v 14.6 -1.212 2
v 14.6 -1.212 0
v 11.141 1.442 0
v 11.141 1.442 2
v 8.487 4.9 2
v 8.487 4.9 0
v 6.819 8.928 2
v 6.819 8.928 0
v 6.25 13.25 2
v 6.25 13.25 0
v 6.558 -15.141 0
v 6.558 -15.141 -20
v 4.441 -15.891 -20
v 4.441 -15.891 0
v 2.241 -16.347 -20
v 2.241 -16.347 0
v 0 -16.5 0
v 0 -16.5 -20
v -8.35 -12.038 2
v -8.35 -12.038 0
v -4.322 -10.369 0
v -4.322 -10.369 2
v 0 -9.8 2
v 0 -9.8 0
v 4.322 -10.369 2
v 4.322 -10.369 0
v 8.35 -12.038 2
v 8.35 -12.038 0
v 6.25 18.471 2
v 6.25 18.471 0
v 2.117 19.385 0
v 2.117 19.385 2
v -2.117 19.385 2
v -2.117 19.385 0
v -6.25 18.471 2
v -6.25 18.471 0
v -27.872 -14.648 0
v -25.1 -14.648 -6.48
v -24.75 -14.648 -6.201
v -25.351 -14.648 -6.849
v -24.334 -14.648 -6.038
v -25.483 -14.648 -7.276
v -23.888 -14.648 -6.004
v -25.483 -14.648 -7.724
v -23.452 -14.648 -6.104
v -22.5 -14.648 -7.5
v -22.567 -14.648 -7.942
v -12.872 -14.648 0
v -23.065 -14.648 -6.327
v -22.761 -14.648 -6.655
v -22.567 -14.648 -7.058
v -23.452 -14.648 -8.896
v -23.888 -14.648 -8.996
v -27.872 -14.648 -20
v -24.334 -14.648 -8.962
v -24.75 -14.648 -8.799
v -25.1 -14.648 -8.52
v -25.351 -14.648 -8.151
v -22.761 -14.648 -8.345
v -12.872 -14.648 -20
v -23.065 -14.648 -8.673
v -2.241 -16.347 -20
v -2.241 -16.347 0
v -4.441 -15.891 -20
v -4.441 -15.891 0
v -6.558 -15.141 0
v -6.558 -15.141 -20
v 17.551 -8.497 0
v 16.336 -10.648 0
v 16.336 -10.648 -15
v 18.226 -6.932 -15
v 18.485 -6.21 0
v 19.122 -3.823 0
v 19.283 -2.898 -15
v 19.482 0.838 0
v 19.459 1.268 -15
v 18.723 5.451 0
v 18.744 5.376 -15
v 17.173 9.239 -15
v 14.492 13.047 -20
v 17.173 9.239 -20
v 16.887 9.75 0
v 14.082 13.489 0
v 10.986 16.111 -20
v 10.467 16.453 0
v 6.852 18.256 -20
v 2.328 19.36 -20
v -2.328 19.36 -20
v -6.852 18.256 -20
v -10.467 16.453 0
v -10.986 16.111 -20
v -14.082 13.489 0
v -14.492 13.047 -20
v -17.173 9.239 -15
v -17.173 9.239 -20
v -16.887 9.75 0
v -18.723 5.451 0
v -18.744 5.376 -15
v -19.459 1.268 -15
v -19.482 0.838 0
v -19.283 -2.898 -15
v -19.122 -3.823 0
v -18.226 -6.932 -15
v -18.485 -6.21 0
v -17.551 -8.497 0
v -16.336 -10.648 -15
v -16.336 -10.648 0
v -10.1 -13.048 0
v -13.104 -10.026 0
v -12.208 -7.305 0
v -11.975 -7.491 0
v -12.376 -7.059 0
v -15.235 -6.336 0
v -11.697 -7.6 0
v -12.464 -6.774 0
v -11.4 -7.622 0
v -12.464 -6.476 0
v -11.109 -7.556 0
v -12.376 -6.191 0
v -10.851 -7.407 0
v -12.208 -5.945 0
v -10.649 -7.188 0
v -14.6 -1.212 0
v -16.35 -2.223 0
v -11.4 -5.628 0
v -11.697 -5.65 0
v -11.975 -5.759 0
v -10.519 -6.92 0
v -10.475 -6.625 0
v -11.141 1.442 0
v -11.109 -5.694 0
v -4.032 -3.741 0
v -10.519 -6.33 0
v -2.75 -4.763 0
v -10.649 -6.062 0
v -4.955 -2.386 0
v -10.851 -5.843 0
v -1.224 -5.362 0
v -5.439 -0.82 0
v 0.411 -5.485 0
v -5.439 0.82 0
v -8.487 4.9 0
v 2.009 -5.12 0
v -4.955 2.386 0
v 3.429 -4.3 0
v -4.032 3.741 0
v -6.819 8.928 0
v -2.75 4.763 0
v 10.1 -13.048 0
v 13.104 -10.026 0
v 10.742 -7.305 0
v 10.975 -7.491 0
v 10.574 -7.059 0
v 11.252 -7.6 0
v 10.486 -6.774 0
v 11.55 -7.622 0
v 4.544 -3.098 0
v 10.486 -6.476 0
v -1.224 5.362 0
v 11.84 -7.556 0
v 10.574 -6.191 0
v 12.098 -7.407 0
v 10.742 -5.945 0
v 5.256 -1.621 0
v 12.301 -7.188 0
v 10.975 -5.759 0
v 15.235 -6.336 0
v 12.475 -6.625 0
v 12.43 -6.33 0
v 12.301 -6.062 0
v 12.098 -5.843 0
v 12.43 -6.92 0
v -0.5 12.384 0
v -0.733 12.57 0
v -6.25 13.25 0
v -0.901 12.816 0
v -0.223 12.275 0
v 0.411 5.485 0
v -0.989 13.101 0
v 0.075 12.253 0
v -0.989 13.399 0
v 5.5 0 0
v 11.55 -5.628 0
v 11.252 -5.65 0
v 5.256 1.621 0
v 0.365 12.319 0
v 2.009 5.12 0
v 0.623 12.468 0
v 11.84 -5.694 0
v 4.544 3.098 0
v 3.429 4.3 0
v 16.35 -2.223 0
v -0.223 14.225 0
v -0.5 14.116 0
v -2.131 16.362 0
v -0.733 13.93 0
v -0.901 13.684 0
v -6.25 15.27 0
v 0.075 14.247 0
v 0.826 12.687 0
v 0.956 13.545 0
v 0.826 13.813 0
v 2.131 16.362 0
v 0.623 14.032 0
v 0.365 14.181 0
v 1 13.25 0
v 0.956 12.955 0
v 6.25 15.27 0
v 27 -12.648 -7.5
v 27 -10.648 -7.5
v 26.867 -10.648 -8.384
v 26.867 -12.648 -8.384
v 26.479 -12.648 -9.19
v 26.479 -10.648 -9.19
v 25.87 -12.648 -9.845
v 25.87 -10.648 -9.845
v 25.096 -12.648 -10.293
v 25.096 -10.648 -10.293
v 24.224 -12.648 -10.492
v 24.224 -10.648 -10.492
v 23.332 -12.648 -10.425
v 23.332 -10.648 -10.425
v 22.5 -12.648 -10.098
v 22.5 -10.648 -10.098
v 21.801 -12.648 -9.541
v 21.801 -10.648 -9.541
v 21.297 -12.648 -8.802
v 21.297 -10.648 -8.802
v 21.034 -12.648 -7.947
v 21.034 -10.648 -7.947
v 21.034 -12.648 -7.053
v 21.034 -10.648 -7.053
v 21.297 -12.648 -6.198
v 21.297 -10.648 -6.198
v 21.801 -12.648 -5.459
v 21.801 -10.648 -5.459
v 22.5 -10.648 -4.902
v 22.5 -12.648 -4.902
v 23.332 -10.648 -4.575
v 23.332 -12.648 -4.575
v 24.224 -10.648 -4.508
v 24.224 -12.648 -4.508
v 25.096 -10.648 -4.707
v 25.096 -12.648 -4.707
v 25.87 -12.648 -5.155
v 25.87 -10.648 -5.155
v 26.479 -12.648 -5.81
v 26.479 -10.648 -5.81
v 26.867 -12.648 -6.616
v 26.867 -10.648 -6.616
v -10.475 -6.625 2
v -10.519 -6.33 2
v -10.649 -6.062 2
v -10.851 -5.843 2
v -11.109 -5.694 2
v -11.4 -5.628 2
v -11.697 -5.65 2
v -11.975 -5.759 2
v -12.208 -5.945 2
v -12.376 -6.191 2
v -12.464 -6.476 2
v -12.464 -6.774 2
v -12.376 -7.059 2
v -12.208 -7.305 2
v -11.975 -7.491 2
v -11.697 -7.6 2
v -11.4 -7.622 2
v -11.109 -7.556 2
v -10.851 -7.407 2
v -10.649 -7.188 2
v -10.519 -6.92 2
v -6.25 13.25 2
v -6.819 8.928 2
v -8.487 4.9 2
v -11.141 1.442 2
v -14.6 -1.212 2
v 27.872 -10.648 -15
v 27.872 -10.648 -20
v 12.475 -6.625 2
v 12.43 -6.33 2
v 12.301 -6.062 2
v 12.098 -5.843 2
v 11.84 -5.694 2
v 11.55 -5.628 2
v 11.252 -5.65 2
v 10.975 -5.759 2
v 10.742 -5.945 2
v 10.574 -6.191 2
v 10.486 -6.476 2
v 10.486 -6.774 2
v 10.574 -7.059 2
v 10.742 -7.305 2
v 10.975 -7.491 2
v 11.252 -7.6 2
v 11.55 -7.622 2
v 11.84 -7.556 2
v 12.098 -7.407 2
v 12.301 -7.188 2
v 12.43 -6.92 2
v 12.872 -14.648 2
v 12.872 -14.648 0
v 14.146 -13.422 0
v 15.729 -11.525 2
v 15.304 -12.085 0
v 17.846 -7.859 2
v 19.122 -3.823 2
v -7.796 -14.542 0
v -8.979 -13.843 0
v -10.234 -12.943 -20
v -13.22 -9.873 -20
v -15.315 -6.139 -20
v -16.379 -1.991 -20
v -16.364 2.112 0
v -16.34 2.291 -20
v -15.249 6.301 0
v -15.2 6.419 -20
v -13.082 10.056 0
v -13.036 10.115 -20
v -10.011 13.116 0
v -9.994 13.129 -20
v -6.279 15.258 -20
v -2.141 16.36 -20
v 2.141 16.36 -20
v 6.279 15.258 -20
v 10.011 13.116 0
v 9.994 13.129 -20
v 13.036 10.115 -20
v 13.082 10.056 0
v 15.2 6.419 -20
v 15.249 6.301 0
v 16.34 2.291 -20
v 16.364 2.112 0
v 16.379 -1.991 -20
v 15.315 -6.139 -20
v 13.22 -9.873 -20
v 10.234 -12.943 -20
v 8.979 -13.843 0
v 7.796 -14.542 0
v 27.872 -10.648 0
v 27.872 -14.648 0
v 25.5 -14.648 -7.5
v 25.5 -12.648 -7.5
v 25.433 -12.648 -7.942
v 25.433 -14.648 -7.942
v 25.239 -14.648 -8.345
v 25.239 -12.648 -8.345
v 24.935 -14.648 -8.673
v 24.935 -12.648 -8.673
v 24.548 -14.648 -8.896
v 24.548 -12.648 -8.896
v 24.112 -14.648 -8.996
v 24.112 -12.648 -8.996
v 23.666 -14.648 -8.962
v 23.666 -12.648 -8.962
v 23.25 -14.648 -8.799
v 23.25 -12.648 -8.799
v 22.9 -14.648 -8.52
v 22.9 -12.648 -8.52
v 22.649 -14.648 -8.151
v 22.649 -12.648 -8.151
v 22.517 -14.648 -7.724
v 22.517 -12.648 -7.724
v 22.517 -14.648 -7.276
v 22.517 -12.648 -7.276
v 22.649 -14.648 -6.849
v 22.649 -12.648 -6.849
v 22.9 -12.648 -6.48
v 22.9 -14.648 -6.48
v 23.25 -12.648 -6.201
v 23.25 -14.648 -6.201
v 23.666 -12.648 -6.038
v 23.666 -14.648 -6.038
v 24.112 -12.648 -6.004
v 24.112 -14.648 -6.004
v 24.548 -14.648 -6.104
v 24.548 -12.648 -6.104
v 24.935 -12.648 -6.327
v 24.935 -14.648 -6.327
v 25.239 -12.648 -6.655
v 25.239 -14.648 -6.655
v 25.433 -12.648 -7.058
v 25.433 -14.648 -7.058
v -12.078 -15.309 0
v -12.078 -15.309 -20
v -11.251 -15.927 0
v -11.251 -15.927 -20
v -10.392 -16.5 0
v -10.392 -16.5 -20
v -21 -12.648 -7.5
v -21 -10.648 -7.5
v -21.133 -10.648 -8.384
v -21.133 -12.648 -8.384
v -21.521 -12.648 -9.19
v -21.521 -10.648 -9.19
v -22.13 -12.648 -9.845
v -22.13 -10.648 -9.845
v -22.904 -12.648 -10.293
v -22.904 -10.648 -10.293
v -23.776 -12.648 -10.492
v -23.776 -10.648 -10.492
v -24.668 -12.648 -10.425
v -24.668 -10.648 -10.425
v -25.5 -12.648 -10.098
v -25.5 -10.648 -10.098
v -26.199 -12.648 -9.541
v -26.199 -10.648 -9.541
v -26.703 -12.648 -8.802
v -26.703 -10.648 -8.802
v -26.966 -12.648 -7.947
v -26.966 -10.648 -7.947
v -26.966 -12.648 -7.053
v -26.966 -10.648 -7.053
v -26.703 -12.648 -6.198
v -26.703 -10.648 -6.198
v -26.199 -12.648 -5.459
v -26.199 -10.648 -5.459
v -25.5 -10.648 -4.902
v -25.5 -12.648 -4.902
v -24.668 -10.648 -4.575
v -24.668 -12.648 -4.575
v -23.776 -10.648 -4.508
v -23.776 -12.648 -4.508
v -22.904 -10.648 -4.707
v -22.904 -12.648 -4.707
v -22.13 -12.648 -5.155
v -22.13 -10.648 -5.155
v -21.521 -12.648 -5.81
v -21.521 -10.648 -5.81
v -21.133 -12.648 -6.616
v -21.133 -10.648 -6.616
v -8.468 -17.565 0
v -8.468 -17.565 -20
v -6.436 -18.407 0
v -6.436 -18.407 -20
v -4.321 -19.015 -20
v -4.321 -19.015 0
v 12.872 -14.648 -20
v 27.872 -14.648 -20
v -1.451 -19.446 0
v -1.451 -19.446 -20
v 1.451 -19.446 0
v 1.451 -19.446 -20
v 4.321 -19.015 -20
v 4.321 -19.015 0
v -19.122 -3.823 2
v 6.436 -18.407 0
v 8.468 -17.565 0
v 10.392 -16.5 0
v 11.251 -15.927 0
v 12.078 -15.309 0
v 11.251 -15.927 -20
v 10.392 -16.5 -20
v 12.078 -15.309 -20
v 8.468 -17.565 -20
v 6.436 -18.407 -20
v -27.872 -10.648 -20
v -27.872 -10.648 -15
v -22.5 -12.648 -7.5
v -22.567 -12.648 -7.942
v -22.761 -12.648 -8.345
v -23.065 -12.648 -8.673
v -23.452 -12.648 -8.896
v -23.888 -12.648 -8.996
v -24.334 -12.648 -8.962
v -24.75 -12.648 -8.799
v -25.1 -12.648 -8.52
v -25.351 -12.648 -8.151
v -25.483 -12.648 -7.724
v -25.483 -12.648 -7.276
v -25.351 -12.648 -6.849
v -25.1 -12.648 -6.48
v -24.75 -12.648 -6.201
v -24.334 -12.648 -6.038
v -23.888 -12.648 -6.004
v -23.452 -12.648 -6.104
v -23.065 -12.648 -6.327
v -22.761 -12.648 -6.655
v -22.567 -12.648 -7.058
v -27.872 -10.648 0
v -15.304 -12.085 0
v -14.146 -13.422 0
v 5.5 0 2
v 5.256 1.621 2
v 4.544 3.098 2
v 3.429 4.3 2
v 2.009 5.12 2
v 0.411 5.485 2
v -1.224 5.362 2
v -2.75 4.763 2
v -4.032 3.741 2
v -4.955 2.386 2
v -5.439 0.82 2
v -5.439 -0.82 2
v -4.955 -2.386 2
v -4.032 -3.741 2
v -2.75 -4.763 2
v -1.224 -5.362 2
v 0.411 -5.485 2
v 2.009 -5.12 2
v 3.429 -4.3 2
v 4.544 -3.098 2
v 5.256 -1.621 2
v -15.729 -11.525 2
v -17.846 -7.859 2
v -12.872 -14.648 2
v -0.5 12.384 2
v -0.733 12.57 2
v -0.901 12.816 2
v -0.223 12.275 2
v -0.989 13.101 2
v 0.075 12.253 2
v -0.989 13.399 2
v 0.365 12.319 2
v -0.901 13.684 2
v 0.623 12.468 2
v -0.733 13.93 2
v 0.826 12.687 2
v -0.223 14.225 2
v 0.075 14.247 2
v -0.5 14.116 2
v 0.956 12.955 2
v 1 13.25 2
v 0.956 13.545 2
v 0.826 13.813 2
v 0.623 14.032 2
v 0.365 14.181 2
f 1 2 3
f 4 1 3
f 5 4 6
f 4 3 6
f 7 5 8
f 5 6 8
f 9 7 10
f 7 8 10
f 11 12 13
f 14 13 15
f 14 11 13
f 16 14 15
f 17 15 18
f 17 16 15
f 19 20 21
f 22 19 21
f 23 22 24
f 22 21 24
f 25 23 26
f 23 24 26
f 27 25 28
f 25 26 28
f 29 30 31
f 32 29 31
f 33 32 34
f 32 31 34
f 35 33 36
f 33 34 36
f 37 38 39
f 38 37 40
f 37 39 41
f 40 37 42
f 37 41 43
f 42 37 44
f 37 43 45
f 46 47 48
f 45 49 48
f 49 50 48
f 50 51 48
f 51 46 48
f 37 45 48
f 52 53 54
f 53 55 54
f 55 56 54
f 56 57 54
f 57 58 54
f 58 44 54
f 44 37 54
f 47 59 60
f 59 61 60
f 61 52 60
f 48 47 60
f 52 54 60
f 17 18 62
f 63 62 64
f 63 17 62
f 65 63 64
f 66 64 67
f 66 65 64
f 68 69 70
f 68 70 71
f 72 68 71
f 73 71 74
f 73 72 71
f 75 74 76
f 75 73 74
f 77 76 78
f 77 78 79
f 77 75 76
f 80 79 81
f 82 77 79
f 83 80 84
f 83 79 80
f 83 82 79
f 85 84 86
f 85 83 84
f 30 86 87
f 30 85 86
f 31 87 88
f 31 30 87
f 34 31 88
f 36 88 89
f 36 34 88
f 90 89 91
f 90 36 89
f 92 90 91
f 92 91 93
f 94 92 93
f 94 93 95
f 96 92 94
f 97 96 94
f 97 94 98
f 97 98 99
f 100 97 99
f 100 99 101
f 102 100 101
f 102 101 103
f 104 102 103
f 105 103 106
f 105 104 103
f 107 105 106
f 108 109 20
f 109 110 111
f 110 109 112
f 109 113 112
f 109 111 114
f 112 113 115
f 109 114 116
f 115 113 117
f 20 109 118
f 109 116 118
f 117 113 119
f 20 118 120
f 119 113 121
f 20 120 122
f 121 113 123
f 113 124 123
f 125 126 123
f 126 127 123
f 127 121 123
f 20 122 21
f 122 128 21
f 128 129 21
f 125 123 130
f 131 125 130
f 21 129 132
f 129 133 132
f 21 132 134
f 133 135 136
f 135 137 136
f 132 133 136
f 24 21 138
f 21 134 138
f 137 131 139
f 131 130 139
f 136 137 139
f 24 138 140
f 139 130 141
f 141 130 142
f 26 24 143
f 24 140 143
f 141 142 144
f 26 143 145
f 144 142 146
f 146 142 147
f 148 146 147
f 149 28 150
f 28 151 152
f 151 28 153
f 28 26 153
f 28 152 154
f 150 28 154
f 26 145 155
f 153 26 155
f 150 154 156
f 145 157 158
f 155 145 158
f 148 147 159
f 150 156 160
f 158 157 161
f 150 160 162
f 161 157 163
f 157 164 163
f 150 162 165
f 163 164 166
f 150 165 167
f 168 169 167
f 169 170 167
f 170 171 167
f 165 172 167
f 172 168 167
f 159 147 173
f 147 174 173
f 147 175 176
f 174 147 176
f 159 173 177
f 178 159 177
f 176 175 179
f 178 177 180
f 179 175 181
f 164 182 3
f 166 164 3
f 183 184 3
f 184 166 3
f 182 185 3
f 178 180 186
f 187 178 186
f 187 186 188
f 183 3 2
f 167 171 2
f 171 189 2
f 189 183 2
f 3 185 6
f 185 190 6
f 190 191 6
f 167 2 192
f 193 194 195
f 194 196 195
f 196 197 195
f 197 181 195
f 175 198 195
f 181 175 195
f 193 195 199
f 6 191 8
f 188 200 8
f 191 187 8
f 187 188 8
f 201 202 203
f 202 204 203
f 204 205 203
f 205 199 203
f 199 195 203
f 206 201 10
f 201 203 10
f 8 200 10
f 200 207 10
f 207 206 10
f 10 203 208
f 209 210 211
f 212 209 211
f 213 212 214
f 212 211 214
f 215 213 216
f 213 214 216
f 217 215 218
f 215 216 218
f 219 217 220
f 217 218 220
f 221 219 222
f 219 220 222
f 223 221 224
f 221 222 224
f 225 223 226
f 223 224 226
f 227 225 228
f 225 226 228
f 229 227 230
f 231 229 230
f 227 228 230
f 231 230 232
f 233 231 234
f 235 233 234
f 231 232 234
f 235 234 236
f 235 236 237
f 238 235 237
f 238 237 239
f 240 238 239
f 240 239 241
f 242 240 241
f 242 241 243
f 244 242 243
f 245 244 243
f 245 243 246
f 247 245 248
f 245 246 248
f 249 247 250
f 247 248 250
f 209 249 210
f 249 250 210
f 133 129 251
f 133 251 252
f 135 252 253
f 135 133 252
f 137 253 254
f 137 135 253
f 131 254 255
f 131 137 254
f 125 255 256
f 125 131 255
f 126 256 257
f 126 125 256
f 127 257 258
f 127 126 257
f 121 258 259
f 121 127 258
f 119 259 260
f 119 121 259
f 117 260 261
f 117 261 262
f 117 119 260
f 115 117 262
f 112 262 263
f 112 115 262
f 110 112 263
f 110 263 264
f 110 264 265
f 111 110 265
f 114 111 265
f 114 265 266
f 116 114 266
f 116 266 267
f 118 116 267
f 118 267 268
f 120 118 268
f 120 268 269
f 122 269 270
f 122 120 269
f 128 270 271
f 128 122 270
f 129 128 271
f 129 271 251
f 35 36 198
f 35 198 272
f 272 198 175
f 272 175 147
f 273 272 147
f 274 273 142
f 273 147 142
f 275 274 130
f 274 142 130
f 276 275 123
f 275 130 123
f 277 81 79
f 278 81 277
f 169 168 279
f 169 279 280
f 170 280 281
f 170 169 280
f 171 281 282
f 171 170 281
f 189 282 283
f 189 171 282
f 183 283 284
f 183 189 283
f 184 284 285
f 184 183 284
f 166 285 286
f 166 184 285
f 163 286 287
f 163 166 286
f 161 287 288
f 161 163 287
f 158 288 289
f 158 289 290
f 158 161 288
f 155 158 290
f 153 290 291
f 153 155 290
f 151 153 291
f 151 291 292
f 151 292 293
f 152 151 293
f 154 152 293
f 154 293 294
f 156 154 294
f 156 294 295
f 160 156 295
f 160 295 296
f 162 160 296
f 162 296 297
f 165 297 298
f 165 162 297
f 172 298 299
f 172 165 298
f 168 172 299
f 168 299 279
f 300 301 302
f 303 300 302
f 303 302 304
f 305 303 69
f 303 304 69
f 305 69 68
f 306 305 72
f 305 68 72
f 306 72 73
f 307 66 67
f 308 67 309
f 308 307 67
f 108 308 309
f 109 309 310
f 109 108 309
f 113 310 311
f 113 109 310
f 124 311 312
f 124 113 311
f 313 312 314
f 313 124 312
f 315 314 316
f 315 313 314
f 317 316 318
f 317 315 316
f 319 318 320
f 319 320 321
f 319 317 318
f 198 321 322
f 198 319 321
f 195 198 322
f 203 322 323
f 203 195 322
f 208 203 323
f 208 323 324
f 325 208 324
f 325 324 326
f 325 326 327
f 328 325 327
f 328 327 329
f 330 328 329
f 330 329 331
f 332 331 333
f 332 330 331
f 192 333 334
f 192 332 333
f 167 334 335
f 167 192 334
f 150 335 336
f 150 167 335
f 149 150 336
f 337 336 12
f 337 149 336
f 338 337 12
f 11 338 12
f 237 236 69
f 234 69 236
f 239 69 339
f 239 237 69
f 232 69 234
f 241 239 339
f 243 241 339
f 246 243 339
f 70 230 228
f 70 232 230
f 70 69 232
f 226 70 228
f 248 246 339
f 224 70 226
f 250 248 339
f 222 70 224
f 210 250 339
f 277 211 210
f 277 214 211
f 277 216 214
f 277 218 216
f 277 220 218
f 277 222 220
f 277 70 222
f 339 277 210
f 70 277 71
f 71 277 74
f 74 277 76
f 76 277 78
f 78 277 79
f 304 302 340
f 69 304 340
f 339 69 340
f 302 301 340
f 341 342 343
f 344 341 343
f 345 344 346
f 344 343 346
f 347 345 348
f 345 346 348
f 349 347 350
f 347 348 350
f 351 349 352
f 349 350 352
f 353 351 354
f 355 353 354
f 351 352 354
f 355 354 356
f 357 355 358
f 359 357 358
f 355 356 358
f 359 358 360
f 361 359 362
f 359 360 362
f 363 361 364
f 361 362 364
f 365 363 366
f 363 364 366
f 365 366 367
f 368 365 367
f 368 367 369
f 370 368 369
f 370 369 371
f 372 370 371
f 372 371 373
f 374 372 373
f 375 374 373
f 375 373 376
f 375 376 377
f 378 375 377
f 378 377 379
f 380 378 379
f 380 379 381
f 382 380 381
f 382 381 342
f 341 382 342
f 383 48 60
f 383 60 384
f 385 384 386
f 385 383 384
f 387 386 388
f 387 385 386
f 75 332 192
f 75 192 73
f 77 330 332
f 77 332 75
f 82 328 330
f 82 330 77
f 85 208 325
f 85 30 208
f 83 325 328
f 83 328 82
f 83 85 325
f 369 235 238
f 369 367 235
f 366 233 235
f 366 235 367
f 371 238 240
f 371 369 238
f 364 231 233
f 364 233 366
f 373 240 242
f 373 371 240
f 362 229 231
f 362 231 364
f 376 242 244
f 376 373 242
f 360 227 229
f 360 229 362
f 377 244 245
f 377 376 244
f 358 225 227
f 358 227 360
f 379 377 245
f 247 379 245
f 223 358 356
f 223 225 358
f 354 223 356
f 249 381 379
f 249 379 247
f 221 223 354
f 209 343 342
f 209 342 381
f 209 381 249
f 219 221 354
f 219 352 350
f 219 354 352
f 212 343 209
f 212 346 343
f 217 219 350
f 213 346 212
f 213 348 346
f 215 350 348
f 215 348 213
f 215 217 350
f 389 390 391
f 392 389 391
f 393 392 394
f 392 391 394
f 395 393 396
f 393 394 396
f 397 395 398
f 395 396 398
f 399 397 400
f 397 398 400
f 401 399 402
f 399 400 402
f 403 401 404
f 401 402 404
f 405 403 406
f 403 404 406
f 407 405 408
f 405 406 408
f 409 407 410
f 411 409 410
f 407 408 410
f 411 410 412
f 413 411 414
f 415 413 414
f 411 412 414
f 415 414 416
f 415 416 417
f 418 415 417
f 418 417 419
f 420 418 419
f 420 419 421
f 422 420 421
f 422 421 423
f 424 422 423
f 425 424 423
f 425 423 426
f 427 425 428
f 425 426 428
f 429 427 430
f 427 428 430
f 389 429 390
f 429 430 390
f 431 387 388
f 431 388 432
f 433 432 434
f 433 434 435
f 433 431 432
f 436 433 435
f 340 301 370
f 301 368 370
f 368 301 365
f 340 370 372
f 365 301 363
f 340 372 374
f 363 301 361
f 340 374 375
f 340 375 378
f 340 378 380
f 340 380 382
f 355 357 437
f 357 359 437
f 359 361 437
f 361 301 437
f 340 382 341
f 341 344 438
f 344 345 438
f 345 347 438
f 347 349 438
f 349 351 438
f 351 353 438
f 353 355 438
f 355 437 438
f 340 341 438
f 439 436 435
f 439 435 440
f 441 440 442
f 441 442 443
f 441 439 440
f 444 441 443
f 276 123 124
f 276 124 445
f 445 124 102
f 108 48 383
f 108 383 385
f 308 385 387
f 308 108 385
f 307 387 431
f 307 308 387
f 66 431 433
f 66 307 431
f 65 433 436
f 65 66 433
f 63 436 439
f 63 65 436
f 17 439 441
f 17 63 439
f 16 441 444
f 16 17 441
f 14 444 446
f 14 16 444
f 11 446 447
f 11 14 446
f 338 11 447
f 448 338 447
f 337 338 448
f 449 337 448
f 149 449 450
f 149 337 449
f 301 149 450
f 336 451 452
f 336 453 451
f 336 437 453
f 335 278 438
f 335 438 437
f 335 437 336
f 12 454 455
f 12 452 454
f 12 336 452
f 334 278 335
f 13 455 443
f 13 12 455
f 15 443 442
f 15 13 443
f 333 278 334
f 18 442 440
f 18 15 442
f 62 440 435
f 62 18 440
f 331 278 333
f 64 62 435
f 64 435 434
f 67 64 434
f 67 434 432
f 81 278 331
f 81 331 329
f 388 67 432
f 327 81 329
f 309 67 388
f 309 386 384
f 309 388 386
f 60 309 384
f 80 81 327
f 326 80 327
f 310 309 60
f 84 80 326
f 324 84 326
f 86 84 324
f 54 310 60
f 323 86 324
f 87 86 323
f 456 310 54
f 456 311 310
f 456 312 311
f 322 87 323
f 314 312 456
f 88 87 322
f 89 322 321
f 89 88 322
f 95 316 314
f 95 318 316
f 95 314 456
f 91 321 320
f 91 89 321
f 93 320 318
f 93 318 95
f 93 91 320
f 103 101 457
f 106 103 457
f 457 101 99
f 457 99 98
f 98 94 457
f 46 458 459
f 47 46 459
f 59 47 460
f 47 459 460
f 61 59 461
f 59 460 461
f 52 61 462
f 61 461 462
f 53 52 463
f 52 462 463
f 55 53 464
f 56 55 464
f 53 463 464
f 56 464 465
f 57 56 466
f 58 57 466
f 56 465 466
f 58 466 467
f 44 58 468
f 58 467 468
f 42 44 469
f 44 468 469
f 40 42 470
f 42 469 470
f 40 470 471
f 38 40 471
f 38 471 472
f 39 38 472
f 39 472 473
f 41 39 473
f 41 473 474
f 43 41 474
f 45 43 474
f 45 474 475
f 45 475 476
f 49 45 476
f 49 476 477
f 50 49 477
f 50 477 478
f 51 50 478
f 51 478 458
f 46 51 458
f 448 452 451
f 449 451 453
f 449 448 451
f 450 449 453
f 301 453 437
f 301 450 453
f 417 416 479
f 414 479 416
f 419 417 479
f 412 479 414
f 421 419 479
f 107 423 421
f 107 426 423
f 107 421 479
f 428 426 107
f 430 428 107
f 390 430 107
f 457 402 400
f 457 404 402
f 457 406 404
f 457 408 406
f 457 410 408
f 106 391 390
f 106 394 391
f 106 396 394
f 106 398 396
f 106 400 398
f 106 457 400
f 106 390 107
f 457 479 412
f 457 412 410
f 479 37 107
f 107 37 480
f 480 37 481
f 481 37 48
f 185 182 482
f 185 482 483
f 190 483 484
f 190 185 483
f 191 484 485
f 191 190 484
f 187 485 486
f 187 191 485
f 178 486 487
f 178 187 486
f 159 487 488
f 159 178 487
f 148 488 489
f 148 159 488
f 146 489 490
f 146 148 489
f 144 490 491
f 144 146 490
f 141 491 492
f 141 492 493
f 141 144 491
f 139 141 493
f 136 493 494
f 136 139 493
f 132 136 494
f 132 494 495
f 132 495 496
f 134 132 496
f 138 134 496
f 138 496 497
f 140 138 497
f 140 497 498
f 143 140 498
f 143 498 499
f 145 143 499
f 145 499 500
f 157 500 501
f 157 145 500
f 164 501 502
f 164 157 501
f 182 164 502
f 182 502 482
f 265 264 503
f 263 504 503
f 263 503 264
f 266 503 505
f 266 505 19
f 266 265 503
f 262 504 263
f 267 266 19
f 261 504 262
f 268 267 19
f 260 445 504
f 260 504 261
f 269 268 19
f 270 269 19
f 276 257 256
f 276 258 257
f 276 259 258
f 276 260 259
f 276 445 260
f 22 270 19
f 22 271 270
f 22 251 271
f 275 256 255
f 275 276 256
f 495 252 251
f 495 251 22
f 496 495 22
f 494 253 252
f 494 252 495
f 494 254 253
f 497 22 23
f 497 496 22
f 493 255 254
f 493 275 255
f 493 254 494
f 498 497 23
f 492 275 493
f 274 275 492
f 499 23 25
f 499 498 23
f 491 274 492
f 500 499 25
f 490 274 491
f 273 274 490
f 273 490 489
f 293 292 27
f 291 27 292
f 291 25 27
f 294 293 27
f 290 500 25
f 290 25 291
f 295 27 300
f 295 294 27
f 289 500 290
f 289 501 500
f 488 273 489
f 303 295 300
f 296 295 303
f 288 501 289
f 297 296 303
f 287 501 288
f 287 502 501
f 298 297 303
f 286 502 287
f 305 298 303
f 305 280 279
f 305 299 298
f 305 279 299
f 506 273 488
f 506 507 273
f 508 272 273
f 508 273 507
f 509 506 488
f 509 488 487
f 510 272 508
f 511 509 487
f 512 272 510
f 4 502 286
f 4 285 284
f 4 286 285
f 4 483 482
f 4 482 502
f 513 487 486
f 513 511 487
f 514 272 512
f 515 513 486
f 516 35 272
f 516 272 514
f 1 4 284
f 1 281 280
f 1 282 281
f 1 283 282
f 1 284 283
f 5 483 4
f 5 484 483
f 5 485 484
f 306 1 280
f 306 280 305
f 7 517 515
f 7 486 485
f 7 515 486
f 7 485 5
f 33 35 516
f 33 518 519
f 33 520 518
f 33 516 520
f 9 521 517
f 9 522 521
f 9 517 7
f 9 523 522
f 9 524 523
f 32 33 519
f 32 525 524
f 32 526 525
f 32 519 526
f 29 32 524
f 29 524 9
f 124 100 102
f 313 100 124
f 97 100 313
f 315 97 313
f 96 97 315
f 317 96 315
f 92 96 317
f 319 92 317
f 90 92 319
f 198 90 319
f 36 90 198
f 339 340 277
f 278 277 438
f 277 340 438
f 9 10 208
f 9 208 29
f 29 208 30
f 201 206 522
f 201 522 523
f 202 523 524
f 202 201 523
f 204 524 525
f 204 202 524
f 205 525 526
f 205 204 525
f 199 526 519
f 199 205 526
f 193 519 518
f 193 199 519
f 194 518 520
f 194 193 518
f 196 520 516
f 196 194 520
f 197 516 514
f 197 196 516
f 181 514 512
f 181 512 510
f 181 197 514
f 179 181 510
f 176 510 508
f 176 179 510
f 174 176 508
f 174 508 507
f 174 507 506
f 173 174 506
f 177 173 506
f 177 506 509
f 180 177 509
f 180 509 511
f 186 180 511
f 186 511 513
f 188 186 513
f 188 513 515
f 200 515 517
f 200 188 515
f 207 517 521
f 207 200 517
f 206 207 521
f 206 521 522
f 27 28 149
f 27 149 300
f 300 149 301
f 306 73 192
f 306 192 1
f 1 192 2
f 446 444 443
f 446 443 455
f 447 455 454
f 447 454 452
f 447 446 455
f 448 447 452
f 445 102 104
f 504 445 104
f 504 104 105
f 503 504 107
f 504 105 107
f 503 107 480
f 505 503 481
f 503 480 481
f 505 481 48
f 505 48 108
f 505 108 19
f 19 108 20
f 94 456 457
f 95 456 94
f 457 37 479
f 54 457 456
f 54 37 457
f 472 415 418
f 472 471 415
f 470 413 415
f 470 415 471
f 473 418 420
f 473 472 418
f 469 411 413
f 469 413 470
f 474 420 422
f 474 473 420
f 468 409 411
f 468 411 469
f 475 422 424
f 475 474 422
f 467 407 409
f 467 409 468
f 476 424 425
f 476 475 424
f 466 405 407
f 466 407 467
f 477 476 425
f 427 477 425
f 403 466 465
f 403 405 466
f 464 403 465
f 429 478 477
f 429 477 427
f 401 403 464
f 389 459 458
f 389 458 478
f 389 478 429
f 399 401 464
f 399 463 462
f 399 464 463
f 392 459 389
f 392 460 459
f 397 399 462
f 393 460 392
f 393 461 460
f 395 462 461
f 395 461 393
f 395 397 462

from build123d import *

# Parameters (mm, degrees)
SKETCH_1_R          = 5.5
SKETCH_1_R_2        = 1
EXTRUDE_1_DEPTH     = 2
EXTRUDE_START       = -20
EXTRUDE_2_DEPTH     = 20
EXTRUDE_3_DEPTH     = 20
SKETCH_6_W          = 15
SKETCH_6_H          = 20
EXTRUDE_9_DEPTH     = 4
EXTRUDE_10_DEPTH    = 5
EXTRUDE_11_DEPTH    = 5
SKETCH_9_R          = 1.5
CUT_EXTRUDE_3_DEPTH = 10
SKETCH_11_R         = 3
CUT_EXTRUDE_4_DEPTH = 2


with BuildPart() as part:
    # 草图1 → 凸台-拉伸1 (new body)
    with BuildSketch(Plane.XY):
        with BuildLine():
            Line((6.25, 13.25), (6.25, 18.471261462))
            ThreePointArc((6.25, 18.471261462), (0, 19.5), (-6.25, 18.471261462))
            Line((-6.25, 18.471261462), (-6.25, 13.25))
            ThreePointArc((-6.25, 13.25), (-8.487331974, 4.9001634), (-14.5998366, -1.212341226))
            Line((-14.5998366, -1.212341226), (-19.121581666, -3.822971957))
            ThreePointArc((-19.121581666, -3.822971957), (-16.887495374, -9.75), (-12.871581666, -14.648289505))
            Line((-12.871581666, -14.648289505), (-8.3498366, -12.037658774))
            ThreePointArc((-8.3498366, -12.037658774), (0, -9.8003268), (8.3498366, -12.037658774))
            Line((8.3498366, -12.037658774), (12.871581666, -14.648289505))
            ThreePointArc((12.871581666, -14.648289505), (16.887495374, -9.75), (19.121581666, -3.822971957))
            Line((19.121581666, -3.822971957), (14.5998366, -1.212341226))
            ThreePointArc((14.5998366, -1.212341226), (8.487331974, 4.9001634), (6.25, 13.25))
        make_face()
        Circle(SKETCH_1_R, mode=Mode.SUBTRACT)
        with Locations((0, 13.25)):
            Circle(SKETCH_1_R_2, mode=Mode.SUBTRACT)
        with Locations((11.4748366, -6.625)):
            Circle(SKETCH_1_R_2, mode=Mode.SUBTRACT)
        with Locations((-11.4748366, -6.625)):
            Circle(SKETCH_1_R_2, mode=Mode.SUBTRACT)
    extrude(amount=EXTRUDE_1_DEPTH)

    # 草图1<3> → 凸台-拉伸2 (add)
    with BuildSketch(Plane.XY.offset(EXTRUDE_START)):
        with BuildLine():
            Line((6.55834649, -15.140610665), (5.773502692, -16.5))
            Line((5.773502692, -16.5), (10.392304845, -16.5))
            ThreePointArc((10.392304845, -16.5), (0, 19.5), (-10.392304845, -16.5))
            Line((-10.392304845, -16.5), (-5.773502692, -16.5))
            Line((-5.773502692, -16.5), (-6.55834649, -15.140610665))
            ThreePointArc((-6.55834649, -15.140610665), (0, 16.5), (6.55834649, -15.140610665))
        make_face()
    extrude(amount=EXTRUDE_2_DEPTH)

    # 草图1<4> → 凸台-拉伸3 (add)
    with BuildSketch(Plane.XY.offset(EXTRUDE_START)):
        with BuildLine():
            Line((5.773502692, -16.5), (6.55834649, -15.140610665))
            ThreePointArc((6.55834649, -15.140610665), (0, -16.5), (-6.55834649, -15.140610665))
            Line((-6.55834649, -15.140610665), (-5.773502692, -16.5))
            Line((-5.773502692, -16.5), (-10.392304845, -16.5))
            ThreePointArc((-10.392304845, -16.5), (0, -19.5), (10.392304845, -16.5))
            Line((10.392304845, -16.5), (5.773502692, -16.5))
        make_face()
    extrude(amount=EXTRUDE_3_DEPTH)

    # 草图6 → 凸台-拉伸9 (add)
    with BuildSketch(Plane(origin=(0, -14.648289505, 0), x_dir=(1, 0, 0), z_dir=(0, 1, 0))):
        with Locations((-20.371581666, 10)):
            Rectangle(SKETCH_6_W, SKETCH_6_H)
        with Locations((20.371581666, 10)):
            Rectangle(SKETCH_6_W, SKETCH_6_H)
    extrude(amount=EXTRUDE_9_DEPTH)

    # 草图8 → 凸台-拉伸10 (add)
    with BuildSketch(Plane(origin=(0, 0, -20), x_dir=(-1, 0, 0), z_dir=(0, 0, -1))):
        with BuildLine():
            Line((-17.172554049, 9.238689703), (-27.871581666, -10.648289505))
            Line((-27.871581666, -10.648289505), (-16.335970452, -10.648289505))
            ThreePointArc((-16.335970452, -10.648289505), (-19.48276903, -0.819579727), (-17.172554049, 9.238689703))
        make_face()
    extrude(amount=-EXTRUDE_10_DEPTH)

    # 草图8<3> → 凸台-拉伸11 (add)
    with BuildSketch(Plane(origin=(0, 0, -20), x_dir=(-1, 0, 0), z_dir=(0, 0, -1))):
        with BuildLine():
            Line((27.871581666, -10.648289505), (17.172554049, 9.238689703))
            ThreePointArc((17.172554049, 9.238689703), (19.48276903, -0.819579727), (16.335970452, -10.648289505))
            Line((16.335970452, -10.648289505), (27.871581666, -10.648289505))
        make_face()
    extrude(amount=-EXTRUDE_11_DEPTH)

    # 草图9 → 切除-拉伸3 (cut)
    with BuildSketch(Plane(origin=(0, -10.648289505, 0), x_dir=(1, 0, 0), z_dir=(0, 1, 0))):
        with Locations((24, 7.5)):
            Circle(SKETCH_9_R)
        with Locations((-24, 7.5)):
            Circle(SKETCH_9_R)
    extrude(amount=-CUT_EXTRUDE_3_DEPTH, mode=Mode.SUBTRACT)

    # 草图11 → 切除-拉伸4 (cut)
    with BuildSketch(Plane(origin=(0, -10.648289505, 0), x_dir=(1, 0, 0), z_dir=(0, 1, 0))):
        with Locations((-24, 7.5)):
            Circle(SKETCH_11_R)
        with Locations((24, 7.5)):
            Circle(SKETCH_11_R)
    extrude(amount=-CUT_EXTRUDE_4_DEPTH, mode=Mode.SUBTRACT)


solid = part.part
